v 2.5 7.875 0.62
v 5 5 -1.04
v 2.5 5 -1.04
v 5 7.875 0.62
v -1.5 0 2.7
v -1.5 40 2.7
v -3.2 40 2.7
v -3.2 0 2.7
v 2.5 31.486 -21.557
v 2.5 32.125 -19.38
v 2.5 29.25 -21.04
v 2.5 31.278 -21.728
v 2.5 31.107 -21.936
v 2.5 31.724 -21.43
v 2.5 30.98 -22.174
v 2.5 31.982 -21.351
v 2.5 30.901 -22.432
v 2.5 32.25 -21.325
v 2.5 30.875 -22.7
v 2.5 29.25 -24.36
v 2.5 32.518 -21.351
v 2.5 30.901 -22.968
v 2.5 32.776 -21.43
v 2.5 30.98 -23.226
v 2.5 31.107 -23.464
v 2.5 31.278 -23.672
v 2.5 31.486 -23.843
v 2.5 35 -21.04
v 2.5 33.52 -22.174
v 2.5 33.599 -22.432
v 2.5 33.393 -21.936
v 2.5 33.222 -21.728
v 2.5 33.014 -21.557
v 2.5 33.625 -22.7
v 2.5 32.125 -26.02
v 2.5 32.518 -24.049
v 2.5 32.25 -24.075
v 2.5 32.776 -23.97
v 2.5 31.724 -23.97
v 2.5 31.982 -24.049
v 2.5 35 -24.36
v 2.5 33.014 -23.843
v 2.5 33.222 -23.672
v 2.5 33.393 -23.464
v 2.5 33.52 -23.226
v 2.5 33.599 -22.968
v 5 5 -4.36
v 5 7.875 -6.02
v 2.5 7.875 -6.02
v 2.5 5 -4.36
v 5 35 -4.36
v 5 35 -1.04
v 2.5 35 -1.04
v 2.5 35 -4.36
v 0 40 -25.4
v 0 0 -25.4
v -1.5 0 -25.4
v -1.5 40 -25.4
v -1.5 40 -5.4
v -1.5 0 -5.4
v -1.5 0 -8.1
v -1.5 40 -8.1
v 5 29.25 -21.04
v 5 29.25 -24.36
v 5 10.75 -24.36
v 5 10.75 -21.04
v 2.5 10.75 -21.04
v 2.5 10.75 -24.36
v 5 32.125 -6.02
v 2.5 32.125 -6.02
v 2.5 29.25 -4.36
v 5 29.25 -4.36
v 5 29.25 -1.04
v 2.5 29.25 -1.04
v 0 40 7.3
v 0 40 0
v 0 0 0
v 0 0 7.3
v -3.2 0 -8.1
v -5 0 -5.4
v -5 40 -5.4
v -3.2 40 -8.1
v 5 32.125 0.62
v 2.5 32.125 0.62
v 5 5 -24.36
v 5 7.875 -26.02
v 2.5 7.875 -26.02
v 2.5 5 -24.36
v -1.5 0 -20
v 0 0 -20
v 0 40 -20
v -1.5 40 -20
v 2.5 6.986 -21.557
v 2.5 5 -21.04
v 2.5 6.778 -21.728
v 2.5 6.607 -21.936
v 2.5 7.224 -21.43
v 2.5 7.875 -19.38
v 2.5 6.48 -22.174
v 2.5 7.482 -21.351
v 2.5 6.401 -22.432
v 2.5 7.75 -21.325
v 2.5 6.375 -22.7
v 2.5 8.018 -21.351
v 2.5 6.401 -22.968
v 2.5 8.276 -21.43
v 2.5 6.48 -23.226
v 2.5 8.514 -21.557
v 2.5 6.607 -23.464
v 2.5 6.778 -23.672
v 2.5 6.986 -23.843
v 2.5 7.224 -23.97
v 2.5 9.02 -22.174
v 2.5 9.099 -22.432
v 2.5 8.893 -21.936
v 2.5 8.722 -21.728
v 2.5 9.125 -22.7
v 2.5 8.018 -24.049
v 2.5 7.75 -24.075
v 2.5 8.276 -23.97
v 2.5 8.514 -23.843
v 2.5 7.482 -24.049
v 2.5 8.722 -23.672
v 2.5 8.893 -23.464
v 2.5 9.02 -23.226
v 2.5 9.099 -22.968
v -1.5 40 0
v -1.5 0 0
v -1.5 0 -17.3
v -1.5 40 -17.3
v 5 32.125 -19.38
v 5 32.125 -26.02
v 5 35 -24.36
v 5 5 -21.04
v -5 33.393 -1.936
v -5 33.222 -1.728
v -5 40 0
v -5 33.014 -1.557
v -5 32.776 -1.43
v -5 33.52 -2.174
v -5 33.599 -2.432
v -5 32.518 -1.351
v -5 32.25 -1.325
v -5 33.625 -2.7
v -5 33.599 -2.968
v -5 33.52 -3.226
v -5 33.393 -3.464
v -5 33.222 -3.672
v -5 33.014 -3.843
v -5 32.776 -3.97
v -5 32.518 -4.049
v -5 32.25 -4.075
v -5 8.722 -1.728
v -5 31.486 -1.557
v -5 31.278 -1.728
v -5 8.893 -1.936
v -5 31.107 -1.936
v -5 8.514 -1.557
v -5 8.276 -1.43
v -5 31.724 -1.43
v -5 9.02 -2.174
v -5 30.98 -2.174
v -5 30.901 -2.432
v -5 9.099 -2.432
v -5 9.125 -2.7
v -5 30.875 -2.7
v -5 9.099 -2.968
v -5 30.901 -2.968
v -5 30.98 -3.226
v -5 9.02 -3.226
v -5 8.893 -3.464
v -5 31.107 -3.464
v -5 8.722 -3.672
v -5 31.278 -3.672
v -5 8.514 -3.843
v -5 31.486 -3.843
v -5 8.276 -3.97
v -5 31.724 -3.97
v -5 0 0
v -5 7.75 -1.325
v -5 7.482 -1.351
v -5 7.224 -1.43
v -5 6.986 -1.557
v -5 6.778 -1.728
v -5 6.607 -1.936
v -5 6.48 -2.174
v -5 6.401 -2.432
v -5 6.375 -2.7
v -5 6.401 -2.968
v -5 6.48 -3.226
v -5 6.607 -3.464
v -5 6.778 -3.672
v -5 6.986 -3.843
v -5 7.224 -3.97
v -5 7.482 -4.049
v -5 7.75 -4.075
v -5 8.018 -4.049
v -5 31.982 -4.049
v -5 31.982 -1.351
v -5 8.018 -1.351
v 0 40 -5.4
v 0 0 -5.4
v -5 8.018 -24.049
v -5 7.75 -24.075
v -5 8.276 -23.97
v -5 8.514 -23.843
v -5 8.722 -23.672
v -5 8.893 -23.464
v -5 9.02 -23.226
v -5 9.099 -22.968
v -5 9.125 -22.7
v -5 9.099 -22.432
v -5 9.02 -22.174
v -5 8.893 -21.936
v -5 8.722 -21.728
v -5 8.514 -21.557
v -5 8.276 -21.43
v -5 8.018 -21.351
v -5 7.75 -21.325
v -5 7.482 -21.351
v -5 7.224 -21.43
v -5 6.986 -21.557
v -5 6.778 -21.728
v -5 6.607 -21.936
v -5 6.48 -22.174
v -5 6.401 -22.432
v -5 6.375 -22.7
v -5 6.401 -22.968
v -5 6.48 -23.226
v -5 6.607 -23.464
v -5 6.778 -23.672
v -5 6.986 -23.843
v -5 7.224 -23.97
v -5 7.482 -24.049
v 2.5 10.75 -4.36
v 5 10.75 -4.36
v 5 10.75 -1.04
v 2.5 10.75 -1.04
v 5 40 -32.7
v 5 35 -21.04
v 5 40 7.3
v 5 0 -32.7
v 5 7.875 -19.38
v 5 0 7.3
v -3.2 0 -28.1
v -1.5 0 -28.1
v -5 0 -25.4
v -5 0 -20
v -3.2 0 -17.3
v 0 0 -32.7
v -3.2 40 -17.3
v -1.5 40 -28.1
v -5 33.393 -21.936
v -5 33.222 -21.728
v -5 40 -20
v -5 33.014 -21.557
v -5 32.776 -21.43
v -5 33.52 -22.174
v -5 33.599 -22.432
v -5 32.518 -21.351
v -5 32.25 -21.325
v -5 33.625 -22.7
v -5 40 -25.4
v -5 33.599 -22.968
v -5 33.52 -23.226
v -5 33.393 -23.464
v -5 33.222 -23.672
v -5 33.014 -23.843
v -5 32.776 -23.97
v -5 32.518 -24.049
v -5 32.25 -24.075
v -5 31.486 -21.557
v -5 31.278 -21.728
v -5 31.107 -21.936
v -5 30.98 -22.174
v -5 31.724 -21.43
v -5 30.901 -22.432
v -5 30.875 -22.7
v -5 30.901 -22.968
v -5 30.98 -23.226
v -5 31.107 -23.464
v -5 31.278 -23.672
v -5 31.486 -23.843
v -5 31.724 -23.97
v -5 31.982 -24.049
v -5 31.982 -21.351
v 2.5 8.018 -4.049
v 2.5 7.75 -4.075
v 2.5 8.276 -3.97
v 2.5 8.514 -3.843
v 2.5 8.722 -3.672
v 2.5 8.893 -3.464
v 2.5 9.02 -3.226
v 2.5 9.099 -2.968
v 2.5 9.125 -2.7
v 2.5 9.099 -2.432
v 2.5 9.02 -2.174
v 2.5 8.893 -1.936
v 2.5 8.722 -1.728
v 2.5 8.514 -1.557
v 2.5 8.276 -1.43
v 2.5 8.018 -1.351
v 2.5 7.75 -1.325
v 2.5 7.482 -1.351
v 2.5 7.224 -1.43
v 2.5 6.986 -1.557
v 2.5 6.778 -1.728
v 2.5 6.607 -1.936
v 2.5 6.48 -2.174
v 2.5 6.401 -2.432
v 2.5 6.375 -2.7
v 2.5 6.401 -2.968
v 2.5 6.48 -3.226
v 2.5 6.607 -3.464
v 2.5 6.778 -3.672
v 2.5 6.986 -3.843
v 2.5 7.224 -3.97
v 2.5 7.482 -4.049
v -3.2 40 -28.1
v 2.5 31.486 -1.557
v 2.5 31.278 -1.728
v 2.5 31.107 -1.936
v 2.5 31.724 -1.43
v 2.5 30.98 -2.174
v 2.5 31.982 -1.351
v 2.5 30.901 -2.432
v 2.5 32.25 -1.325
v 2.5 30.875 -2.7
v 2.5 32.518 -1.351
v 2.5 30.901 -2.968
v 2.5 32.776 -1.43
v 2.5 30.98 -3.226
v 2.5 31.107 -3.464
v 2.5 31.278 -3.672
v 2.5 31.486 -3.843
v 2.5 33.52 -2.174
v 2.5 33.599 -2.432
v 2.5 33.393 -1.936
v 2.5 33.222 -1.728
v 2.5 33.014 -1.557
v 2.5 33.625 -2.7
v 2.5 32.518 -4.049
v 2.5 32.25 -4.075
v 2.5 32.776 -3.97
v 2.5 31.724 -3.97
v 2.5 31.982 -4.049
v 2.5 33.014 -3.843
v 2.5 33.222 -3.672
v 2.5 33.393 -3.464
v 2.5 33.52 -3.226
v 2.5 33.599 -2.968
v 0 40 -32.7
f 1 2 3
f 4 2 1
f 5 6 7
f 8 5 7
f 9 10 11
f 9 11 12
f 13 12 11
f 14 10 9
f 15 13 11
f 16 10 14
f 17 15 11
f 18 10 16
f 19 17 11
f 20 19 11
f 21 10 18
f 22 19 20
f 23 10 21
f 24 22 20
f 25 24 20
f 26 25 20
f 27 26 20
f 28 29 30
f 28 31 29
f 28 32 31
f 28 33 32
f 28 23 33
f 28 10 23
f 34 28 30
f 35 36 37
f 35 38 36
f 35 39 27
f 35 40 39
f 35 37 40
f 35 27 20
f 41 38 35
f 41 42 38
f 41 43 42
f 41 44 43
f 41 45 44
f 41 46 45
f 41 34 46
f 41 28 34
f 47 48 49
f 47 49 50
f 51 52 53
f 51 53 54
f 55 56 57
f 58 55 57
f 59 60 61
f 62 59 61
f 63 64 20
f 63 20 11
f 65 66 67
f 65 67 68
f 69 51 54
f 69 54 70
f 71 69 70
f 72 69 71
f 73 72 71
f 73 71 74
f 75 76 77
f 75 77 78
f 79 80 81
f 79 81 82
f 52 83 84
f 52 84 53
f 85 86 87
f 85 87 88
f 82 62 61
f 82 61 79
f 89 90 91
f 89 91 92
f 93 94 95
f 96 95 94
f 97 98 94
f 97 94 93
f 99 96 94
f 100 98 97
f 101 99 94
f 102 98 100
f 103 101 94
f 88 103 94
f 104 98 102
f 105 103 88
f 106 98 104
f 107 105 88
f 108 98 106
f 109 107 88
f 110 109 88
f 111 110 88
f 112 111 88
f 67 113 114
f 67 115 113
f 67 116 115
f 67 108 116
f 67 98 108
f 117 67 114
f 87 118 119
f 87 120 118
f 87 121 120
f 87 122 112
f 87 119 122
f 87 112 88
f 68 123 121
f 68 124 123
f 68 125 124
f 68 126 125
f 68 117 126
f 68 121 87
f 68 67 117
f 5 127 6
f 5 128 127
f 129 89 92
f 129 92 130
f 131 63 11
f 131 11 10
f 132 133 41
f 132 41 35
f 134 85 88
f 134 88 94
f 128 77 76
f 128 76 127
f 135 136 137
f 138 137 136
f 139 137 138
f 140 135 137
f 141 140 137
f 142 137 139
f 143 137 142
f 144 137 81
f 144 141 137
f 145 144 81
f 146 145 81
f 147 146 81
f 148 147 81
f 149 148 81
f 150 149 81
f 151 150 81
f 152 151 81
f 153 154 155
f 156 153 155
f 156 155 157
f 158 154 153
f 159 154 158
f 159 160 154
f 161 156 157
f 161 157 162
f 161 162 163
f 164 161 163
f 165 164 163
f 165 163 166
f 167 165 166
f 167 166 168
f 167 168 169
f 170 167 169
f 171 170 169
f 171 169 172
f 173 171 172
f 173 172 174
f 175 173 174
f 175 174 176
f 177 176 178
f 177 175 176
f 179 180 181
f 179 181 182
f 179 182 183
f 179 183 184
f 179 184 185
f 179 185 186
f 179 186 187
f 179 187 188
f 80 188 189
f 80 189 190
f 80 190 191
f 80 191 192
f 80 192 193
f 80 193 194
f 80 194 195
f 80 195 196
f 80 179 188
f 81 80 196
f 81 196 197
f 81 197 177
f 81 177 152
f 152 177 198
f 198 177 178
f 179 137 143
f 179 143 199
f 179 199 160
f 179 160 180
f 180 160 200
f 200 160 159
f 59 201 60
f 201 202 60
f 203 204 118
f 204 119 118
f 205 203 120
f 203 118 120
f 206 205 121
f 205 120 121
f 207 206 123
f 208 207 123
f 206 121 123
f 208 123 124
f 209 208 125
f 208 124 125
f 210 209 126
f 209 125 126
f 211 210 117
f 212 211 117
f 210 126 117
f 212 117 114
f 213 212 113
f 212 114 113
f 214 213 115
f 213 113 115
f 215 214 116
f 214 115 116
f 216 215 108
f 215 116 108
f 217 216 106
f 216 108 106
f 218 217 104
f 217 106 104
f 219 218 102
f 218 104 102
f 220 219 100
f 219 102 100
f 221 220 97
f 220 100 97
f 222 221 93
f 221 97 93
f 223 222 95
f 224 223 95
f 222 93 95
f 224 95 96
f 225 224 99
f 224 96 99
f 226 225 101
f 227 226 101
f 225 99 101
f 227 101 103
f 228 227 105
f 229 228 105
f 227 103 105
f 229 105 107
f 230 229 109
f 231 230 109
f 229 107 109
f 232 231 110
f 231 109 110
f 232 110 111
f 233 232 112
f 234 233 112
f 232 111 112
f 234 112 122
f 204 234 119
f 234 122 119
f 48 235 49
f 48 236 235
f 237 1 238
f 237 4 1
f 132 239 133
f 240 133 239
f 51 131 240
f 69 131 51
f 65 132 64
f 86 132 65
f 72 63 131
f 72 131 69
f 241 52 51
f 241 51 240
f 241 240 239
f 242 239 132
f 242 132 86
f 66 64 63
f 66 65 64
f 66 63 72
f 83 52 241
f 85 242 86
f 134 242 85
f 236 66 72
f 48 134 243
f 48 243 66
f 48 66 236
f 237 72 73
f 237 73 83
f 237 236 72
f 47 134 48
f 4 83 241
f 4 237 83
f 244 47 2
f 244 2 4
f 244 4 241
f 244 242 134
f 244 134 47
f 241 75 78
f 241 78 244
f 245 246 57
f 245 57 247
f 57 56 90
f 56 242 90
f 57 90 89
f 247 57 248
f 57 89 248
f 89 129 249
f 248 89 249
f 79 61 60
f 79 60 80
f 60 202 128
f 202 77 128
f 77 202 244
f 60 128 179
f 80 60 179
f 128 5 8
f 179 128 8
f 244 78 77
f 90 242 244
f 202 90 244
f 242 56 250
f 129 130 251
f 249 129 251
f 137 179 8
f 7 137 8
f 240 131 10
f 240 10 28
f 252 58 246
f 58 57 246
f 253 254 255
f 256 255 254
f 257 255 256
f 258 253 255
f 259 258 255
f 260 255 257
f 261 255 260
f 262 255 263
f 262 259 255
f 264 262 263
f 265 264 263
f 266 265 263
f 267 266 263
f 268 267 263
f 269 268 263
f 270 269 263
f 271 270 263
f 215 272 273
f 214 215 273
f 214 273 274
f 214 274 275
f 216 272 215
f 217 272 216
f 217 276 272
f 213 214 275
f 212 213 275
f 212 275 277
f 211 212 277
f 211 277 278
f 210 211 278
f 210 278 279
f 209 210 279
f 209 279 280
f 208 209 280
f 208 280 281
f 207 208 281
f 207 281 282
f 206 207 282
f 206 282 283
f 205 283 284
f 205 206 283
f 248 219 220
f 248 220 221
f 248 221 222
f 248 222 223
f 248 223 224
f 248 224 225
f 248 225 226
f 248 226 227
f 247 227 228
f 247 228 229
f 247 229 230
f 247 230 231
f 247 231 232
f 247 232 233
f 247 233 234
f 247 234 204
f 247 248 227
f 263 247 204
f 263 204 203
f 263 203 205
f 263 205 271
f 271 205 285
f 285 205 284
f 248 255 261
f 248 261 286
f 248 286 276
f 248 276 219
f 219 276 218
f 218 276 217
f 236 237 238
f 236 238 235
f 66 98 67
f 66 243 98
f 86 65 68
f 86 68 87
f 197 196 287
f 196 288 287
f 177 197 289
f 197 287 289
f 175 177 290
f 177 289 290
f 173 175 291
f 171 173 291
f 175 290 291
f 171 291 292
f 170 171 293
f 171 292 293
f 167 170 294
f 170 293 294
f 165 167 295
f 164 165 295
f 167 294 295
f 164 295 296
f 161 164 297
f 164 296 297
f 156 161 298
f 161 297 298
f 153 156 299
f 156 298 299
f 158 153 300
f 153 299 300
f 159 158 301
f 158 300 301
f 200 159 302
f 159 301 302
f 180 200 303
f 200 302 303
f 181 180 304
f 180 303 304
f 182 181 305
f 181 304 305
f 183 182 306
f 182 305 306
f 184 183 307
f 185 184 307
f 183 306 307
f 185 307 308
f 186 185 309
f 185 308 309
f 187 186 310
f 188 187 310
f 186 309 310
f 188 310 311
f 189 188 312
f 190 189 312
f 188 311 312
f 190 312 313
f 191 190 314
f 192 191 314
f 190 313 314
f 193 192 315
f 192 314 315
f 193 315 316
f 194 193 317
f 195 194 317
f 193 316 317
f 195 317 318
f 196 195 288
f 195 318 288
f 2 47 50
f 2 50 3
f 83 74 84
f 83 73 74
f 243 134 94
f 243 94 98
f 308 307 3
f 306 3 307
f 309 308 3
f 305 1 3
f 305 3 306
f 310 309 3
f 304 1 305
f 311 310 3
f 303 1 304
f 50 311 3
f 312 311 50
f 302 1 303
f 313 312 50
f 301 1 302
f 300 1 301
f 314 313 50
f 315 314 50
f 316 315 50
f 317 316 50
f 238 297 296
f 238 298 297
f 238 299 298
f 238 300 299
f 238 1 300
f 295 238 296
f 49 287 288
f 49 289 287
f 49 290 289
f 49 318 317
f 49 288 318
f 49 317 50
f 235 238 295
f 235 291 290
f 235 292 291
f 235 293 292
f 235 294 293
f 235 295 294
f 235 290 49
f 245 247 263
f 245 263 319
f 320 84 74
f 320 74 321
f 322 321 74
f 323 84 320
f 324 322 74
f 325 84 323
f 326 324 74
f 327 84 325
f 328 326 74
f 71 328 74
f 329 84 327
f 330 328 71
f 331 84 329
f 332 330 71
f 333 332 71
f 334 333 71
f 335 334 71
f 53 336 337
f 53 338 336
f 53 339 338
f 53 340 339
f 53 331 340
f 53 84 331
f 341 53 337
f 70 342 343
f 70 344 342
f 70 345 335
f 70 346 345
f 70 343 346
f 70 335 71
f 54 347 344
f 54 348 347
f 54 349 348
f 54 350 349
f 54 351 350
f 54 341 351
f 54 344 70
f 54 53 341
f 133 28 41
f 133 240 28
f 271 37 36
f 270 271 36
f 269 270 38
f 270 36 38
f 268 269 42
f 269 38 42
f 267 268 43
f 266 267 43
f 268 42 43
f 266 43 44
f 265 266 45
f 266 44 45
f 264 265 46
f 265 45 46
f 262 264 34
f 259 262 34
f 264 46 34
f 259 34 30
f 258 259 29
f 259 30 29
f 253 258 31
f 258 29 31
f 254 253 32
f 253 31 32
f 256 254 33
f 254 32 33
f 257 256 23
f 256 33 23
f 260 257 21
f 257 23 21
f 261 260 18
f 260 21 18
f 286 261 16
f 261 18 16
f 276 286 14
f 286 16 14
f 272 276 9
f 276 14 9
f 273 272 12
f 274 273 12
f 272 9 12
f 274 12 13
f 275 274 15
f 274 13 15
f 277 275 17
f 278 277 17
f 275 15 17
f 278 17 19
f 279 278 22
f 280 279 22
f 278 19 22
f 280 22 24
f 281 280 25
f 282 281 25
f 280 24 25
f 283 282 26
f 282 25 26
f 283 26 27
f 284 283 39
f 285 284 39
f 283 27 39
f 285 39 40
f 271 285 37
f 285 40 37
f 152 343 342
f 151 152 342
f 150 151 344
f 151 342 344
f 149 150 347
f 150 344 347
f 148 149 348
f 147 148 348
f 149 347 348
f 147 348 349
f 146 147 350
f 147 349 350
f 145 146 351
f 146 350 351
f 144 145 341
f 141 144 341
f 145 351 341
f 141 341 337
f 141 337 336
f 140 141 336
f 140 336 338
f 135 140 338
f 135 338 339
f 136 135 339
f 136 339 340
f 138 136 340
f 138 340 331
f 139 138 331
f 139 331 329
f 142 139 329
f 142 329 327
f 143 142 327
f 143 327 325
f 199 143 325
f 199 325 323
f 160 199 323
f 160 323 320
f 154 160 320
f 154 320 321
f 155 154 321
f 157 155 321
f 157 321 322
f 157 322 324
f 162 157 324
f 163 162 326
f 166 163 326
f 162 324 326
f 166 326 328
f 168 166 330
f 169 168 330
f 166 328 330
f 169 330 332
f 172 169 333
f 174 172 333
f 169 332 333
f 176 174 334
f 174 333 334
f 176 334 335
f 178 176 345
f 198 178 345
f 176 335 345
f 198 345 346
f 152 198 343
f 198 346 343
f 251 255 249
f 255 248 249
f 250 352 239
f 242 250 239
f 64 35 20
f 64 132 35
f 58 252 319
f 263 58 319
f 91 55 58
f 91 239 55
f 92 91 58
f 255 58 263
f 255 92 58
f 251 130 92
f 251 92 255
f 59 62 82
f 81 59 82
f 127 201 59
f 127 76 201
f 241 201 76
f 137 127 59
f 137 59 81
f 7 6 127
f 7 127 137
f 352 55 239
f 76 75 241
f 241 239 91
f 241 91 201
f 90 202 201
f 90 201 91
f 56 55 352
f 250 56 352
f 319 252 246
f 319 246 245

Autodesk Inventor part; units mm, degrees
ref_plane "YZ Plane" through (0, 0, 0) normal (1, 0, 0) x (0, 1, 0)
ref_plane "XZ Plane" through (0, 0, 0) normal (0, 1, 0) x (-1, 0, 0)
ref_plane "XY Plane" through (0, 0, 0) normal (0, 0, 1) x (1, 0, 0)
sketch "Sketch1" plane through (0, 0, 0) normal (0, 1, 0) x (-1, 0, 0)
  line L0 (0, -5.4) -> (1.5, -5.4)
  line L1 (1.5, -5.4) -> (1.5, -8.1)
  line L2 (1.5, -8.1) -> (3.2, -8.1)
  line L3 (0, 0) -> (1.5, 0)
  line L4 (1.5, 0) -> (1.5, 2.7)
  line L5 (1.5, 2.7) -> (3.2, 2.7)
  line L6 (5, 0) -> (5, -5.4)
  line L7 (5, -5.4) -> (3.2, -8.1)
  line L8 (5, 0) -> (3.2, 2.7)
  line L9 (0, -20) -> (1.5, -20)
  line L10 (1.5, -20) -> (1.5, -17.3)
  line L11 (1.5, -17.3) -> (3.2, -17.3)
  line L12 (0, -25.4) -> (1.5, -25.4)
  line L13 (1.5, -25.4) -> (1.5, -28.1)
  line L14 (1.5, -28.1) -> (3.2, -28.1)
  line L15 (5, -20) -> (5, -25.4)
  line L16 (5, -25.4) -> (3.2, -28.1)
  line L17 (5, -20) -> (3.2, -17.3)
  line L18 (0, -5.4) -> (0, -20)
  line L19 (0, 0) -> (0, 7.3)
  line L20 (0, 7.3) -> (-5, 7.3)
  line L21 (0, -25.4) -> (0, -32.7)
  line L22 (0, -32.7) -> (-5, -32.7)
  line L23 (-5, -32.7) -> (-5, 7.3)
  dimension "d0" = 5.4
  dimension "d1" = 1.5
  dimension "d2" = 2.7
  dimension "d3" = 1.7
  dimension "d4" = 2.7
  dimension "d5" = 1.7
  dimension "d9" = 2.7
  dimension "d10" = 2.7
  dimension "d11" = 5.4
  dimension "d12" = 7.3
  dimension "d13" = 5
  dimension "d14" = 7.3
  dimension "d15" = 5
  dimension "d16" = 20
extrude "Extrusion1" add sketch "Sketch1" along normal blind 40
sketch "Sketch2" plane through (5, 0, 7.3) normal (1, 0, 0) x (0, 0, -1)
  line L0 (11.6599, 5) -> (8.3401, 5)
  line L1 (8.3401, 5) -> (6.6802, 7.875)
  line L2 (6.6802, 7.875) -> (8.3401, 10.75)
  line L3 (8.3401, 10.75) -> (11.6599, 10.75)
  line L4 (11.6599, 10.75) -> (13.3198, 7.875)
  line L5 (13.3198, 7.875) -> (11.6599, 5)
  line L6 (40, 0) -> (0, 0) projected
  line L7 (0, 0) -> (0, 40) projected
  line L8 (31.6599, 5) -> (28.3401, 5)
  line L9 (28.3401, 5) -> (26.6802, 7.875)
  line L10 (26.6802, 7.875) -> (28.3401, 10.75)
  line L11 (28.3401, 10.75) -> (31.6599, 10.75)
  line L12 (31.6599, 10.75) -> (33.3198, 7.875)
  line L13 (33.3198, 7.875) -> (31.6599, 5)
  line L14 (40, 0) -> (40, 40) projected
  line L15 (11.6599, 29.25) -> (8.3401, 29.25)
  line L16 (8.3401, 29.25) -> (6.6802, 32.125)
  line L17 (6.6802, 32.125) -> (8.3401, 35)
  line L18 (8.3401, 35) -> (11.6599, 35)
  line L19 (11.6599, 35) -> (13.3198, 32.125)
  line L20 (13.3198, 32.125) -> (11.6599, 29.25)
  line L21 (31.6599, 29.25) -> (28.3401, 29.25)
  line L22 (28.3401, 29.25) -> (26.6802, 32.125)
  line L23 (26.6802, 32.125) -> (28.3401, 35)
  line L24 (28.3401, 35) -> (31.6599, 35)
  line L25 (31.6599, 35) -> (33.3198, 32.125)
  line L26 (33.3198, 32.125) -> (31.6599, 29.25)
  line L27 (0, 40) -> (40, 40) projected
  point P0 (7.3, 0)
  point P1 (10, 7.875)
  point P2 (30, 7.875)
  point P3 (10, 32.125)
  point P4 (30, 32.125)
  dimension "d17" = 5.75
  dimension "d18" = 5
  dimension "d19" = 10
  dimension "d20" = 5.75
  dimension "d21" = 5
  dimension "d22" = 10
  dimension "d23" = 5.75
  dimension "d24" = 5.75
  dimension "d25" = 5
  dimension "d26" = 5
  dimension "d27" = 10
  dimension "d28" = 10
extrude "Extrusion2" cut sketch "Sketch2" against normal blind 2.5 contours L0 L1 L2 L3 L4 L5 | L8 L9 L10 L11 L12 L13 | L15 L16 L17 L18 L19 L20 | L21 L22 L23 L24 L25 L26
sketch "Sketch3" plane through (2.5, 0, 7.3) normal (1, 0, 0) x (0, 0, -1)
  circle A0 centre (30, 7.75) radius 1.375
  circle A1 centre (10, 7.75) radius 1.375
  circle A2 centre (10, 32.25) radius 1.375
  circle A3 centre (30, 32.25) radius 1.375
  point P0 (7.3, 0)
  dimension "d31" = 2.75
  dimension "d32" = 2.75
  dimension "d33" = 2.75
extrude "Extrusion3" cut sketch "Sketch3" against normal blind 20
properties part number "slotmountingPlate_dual_m3"
